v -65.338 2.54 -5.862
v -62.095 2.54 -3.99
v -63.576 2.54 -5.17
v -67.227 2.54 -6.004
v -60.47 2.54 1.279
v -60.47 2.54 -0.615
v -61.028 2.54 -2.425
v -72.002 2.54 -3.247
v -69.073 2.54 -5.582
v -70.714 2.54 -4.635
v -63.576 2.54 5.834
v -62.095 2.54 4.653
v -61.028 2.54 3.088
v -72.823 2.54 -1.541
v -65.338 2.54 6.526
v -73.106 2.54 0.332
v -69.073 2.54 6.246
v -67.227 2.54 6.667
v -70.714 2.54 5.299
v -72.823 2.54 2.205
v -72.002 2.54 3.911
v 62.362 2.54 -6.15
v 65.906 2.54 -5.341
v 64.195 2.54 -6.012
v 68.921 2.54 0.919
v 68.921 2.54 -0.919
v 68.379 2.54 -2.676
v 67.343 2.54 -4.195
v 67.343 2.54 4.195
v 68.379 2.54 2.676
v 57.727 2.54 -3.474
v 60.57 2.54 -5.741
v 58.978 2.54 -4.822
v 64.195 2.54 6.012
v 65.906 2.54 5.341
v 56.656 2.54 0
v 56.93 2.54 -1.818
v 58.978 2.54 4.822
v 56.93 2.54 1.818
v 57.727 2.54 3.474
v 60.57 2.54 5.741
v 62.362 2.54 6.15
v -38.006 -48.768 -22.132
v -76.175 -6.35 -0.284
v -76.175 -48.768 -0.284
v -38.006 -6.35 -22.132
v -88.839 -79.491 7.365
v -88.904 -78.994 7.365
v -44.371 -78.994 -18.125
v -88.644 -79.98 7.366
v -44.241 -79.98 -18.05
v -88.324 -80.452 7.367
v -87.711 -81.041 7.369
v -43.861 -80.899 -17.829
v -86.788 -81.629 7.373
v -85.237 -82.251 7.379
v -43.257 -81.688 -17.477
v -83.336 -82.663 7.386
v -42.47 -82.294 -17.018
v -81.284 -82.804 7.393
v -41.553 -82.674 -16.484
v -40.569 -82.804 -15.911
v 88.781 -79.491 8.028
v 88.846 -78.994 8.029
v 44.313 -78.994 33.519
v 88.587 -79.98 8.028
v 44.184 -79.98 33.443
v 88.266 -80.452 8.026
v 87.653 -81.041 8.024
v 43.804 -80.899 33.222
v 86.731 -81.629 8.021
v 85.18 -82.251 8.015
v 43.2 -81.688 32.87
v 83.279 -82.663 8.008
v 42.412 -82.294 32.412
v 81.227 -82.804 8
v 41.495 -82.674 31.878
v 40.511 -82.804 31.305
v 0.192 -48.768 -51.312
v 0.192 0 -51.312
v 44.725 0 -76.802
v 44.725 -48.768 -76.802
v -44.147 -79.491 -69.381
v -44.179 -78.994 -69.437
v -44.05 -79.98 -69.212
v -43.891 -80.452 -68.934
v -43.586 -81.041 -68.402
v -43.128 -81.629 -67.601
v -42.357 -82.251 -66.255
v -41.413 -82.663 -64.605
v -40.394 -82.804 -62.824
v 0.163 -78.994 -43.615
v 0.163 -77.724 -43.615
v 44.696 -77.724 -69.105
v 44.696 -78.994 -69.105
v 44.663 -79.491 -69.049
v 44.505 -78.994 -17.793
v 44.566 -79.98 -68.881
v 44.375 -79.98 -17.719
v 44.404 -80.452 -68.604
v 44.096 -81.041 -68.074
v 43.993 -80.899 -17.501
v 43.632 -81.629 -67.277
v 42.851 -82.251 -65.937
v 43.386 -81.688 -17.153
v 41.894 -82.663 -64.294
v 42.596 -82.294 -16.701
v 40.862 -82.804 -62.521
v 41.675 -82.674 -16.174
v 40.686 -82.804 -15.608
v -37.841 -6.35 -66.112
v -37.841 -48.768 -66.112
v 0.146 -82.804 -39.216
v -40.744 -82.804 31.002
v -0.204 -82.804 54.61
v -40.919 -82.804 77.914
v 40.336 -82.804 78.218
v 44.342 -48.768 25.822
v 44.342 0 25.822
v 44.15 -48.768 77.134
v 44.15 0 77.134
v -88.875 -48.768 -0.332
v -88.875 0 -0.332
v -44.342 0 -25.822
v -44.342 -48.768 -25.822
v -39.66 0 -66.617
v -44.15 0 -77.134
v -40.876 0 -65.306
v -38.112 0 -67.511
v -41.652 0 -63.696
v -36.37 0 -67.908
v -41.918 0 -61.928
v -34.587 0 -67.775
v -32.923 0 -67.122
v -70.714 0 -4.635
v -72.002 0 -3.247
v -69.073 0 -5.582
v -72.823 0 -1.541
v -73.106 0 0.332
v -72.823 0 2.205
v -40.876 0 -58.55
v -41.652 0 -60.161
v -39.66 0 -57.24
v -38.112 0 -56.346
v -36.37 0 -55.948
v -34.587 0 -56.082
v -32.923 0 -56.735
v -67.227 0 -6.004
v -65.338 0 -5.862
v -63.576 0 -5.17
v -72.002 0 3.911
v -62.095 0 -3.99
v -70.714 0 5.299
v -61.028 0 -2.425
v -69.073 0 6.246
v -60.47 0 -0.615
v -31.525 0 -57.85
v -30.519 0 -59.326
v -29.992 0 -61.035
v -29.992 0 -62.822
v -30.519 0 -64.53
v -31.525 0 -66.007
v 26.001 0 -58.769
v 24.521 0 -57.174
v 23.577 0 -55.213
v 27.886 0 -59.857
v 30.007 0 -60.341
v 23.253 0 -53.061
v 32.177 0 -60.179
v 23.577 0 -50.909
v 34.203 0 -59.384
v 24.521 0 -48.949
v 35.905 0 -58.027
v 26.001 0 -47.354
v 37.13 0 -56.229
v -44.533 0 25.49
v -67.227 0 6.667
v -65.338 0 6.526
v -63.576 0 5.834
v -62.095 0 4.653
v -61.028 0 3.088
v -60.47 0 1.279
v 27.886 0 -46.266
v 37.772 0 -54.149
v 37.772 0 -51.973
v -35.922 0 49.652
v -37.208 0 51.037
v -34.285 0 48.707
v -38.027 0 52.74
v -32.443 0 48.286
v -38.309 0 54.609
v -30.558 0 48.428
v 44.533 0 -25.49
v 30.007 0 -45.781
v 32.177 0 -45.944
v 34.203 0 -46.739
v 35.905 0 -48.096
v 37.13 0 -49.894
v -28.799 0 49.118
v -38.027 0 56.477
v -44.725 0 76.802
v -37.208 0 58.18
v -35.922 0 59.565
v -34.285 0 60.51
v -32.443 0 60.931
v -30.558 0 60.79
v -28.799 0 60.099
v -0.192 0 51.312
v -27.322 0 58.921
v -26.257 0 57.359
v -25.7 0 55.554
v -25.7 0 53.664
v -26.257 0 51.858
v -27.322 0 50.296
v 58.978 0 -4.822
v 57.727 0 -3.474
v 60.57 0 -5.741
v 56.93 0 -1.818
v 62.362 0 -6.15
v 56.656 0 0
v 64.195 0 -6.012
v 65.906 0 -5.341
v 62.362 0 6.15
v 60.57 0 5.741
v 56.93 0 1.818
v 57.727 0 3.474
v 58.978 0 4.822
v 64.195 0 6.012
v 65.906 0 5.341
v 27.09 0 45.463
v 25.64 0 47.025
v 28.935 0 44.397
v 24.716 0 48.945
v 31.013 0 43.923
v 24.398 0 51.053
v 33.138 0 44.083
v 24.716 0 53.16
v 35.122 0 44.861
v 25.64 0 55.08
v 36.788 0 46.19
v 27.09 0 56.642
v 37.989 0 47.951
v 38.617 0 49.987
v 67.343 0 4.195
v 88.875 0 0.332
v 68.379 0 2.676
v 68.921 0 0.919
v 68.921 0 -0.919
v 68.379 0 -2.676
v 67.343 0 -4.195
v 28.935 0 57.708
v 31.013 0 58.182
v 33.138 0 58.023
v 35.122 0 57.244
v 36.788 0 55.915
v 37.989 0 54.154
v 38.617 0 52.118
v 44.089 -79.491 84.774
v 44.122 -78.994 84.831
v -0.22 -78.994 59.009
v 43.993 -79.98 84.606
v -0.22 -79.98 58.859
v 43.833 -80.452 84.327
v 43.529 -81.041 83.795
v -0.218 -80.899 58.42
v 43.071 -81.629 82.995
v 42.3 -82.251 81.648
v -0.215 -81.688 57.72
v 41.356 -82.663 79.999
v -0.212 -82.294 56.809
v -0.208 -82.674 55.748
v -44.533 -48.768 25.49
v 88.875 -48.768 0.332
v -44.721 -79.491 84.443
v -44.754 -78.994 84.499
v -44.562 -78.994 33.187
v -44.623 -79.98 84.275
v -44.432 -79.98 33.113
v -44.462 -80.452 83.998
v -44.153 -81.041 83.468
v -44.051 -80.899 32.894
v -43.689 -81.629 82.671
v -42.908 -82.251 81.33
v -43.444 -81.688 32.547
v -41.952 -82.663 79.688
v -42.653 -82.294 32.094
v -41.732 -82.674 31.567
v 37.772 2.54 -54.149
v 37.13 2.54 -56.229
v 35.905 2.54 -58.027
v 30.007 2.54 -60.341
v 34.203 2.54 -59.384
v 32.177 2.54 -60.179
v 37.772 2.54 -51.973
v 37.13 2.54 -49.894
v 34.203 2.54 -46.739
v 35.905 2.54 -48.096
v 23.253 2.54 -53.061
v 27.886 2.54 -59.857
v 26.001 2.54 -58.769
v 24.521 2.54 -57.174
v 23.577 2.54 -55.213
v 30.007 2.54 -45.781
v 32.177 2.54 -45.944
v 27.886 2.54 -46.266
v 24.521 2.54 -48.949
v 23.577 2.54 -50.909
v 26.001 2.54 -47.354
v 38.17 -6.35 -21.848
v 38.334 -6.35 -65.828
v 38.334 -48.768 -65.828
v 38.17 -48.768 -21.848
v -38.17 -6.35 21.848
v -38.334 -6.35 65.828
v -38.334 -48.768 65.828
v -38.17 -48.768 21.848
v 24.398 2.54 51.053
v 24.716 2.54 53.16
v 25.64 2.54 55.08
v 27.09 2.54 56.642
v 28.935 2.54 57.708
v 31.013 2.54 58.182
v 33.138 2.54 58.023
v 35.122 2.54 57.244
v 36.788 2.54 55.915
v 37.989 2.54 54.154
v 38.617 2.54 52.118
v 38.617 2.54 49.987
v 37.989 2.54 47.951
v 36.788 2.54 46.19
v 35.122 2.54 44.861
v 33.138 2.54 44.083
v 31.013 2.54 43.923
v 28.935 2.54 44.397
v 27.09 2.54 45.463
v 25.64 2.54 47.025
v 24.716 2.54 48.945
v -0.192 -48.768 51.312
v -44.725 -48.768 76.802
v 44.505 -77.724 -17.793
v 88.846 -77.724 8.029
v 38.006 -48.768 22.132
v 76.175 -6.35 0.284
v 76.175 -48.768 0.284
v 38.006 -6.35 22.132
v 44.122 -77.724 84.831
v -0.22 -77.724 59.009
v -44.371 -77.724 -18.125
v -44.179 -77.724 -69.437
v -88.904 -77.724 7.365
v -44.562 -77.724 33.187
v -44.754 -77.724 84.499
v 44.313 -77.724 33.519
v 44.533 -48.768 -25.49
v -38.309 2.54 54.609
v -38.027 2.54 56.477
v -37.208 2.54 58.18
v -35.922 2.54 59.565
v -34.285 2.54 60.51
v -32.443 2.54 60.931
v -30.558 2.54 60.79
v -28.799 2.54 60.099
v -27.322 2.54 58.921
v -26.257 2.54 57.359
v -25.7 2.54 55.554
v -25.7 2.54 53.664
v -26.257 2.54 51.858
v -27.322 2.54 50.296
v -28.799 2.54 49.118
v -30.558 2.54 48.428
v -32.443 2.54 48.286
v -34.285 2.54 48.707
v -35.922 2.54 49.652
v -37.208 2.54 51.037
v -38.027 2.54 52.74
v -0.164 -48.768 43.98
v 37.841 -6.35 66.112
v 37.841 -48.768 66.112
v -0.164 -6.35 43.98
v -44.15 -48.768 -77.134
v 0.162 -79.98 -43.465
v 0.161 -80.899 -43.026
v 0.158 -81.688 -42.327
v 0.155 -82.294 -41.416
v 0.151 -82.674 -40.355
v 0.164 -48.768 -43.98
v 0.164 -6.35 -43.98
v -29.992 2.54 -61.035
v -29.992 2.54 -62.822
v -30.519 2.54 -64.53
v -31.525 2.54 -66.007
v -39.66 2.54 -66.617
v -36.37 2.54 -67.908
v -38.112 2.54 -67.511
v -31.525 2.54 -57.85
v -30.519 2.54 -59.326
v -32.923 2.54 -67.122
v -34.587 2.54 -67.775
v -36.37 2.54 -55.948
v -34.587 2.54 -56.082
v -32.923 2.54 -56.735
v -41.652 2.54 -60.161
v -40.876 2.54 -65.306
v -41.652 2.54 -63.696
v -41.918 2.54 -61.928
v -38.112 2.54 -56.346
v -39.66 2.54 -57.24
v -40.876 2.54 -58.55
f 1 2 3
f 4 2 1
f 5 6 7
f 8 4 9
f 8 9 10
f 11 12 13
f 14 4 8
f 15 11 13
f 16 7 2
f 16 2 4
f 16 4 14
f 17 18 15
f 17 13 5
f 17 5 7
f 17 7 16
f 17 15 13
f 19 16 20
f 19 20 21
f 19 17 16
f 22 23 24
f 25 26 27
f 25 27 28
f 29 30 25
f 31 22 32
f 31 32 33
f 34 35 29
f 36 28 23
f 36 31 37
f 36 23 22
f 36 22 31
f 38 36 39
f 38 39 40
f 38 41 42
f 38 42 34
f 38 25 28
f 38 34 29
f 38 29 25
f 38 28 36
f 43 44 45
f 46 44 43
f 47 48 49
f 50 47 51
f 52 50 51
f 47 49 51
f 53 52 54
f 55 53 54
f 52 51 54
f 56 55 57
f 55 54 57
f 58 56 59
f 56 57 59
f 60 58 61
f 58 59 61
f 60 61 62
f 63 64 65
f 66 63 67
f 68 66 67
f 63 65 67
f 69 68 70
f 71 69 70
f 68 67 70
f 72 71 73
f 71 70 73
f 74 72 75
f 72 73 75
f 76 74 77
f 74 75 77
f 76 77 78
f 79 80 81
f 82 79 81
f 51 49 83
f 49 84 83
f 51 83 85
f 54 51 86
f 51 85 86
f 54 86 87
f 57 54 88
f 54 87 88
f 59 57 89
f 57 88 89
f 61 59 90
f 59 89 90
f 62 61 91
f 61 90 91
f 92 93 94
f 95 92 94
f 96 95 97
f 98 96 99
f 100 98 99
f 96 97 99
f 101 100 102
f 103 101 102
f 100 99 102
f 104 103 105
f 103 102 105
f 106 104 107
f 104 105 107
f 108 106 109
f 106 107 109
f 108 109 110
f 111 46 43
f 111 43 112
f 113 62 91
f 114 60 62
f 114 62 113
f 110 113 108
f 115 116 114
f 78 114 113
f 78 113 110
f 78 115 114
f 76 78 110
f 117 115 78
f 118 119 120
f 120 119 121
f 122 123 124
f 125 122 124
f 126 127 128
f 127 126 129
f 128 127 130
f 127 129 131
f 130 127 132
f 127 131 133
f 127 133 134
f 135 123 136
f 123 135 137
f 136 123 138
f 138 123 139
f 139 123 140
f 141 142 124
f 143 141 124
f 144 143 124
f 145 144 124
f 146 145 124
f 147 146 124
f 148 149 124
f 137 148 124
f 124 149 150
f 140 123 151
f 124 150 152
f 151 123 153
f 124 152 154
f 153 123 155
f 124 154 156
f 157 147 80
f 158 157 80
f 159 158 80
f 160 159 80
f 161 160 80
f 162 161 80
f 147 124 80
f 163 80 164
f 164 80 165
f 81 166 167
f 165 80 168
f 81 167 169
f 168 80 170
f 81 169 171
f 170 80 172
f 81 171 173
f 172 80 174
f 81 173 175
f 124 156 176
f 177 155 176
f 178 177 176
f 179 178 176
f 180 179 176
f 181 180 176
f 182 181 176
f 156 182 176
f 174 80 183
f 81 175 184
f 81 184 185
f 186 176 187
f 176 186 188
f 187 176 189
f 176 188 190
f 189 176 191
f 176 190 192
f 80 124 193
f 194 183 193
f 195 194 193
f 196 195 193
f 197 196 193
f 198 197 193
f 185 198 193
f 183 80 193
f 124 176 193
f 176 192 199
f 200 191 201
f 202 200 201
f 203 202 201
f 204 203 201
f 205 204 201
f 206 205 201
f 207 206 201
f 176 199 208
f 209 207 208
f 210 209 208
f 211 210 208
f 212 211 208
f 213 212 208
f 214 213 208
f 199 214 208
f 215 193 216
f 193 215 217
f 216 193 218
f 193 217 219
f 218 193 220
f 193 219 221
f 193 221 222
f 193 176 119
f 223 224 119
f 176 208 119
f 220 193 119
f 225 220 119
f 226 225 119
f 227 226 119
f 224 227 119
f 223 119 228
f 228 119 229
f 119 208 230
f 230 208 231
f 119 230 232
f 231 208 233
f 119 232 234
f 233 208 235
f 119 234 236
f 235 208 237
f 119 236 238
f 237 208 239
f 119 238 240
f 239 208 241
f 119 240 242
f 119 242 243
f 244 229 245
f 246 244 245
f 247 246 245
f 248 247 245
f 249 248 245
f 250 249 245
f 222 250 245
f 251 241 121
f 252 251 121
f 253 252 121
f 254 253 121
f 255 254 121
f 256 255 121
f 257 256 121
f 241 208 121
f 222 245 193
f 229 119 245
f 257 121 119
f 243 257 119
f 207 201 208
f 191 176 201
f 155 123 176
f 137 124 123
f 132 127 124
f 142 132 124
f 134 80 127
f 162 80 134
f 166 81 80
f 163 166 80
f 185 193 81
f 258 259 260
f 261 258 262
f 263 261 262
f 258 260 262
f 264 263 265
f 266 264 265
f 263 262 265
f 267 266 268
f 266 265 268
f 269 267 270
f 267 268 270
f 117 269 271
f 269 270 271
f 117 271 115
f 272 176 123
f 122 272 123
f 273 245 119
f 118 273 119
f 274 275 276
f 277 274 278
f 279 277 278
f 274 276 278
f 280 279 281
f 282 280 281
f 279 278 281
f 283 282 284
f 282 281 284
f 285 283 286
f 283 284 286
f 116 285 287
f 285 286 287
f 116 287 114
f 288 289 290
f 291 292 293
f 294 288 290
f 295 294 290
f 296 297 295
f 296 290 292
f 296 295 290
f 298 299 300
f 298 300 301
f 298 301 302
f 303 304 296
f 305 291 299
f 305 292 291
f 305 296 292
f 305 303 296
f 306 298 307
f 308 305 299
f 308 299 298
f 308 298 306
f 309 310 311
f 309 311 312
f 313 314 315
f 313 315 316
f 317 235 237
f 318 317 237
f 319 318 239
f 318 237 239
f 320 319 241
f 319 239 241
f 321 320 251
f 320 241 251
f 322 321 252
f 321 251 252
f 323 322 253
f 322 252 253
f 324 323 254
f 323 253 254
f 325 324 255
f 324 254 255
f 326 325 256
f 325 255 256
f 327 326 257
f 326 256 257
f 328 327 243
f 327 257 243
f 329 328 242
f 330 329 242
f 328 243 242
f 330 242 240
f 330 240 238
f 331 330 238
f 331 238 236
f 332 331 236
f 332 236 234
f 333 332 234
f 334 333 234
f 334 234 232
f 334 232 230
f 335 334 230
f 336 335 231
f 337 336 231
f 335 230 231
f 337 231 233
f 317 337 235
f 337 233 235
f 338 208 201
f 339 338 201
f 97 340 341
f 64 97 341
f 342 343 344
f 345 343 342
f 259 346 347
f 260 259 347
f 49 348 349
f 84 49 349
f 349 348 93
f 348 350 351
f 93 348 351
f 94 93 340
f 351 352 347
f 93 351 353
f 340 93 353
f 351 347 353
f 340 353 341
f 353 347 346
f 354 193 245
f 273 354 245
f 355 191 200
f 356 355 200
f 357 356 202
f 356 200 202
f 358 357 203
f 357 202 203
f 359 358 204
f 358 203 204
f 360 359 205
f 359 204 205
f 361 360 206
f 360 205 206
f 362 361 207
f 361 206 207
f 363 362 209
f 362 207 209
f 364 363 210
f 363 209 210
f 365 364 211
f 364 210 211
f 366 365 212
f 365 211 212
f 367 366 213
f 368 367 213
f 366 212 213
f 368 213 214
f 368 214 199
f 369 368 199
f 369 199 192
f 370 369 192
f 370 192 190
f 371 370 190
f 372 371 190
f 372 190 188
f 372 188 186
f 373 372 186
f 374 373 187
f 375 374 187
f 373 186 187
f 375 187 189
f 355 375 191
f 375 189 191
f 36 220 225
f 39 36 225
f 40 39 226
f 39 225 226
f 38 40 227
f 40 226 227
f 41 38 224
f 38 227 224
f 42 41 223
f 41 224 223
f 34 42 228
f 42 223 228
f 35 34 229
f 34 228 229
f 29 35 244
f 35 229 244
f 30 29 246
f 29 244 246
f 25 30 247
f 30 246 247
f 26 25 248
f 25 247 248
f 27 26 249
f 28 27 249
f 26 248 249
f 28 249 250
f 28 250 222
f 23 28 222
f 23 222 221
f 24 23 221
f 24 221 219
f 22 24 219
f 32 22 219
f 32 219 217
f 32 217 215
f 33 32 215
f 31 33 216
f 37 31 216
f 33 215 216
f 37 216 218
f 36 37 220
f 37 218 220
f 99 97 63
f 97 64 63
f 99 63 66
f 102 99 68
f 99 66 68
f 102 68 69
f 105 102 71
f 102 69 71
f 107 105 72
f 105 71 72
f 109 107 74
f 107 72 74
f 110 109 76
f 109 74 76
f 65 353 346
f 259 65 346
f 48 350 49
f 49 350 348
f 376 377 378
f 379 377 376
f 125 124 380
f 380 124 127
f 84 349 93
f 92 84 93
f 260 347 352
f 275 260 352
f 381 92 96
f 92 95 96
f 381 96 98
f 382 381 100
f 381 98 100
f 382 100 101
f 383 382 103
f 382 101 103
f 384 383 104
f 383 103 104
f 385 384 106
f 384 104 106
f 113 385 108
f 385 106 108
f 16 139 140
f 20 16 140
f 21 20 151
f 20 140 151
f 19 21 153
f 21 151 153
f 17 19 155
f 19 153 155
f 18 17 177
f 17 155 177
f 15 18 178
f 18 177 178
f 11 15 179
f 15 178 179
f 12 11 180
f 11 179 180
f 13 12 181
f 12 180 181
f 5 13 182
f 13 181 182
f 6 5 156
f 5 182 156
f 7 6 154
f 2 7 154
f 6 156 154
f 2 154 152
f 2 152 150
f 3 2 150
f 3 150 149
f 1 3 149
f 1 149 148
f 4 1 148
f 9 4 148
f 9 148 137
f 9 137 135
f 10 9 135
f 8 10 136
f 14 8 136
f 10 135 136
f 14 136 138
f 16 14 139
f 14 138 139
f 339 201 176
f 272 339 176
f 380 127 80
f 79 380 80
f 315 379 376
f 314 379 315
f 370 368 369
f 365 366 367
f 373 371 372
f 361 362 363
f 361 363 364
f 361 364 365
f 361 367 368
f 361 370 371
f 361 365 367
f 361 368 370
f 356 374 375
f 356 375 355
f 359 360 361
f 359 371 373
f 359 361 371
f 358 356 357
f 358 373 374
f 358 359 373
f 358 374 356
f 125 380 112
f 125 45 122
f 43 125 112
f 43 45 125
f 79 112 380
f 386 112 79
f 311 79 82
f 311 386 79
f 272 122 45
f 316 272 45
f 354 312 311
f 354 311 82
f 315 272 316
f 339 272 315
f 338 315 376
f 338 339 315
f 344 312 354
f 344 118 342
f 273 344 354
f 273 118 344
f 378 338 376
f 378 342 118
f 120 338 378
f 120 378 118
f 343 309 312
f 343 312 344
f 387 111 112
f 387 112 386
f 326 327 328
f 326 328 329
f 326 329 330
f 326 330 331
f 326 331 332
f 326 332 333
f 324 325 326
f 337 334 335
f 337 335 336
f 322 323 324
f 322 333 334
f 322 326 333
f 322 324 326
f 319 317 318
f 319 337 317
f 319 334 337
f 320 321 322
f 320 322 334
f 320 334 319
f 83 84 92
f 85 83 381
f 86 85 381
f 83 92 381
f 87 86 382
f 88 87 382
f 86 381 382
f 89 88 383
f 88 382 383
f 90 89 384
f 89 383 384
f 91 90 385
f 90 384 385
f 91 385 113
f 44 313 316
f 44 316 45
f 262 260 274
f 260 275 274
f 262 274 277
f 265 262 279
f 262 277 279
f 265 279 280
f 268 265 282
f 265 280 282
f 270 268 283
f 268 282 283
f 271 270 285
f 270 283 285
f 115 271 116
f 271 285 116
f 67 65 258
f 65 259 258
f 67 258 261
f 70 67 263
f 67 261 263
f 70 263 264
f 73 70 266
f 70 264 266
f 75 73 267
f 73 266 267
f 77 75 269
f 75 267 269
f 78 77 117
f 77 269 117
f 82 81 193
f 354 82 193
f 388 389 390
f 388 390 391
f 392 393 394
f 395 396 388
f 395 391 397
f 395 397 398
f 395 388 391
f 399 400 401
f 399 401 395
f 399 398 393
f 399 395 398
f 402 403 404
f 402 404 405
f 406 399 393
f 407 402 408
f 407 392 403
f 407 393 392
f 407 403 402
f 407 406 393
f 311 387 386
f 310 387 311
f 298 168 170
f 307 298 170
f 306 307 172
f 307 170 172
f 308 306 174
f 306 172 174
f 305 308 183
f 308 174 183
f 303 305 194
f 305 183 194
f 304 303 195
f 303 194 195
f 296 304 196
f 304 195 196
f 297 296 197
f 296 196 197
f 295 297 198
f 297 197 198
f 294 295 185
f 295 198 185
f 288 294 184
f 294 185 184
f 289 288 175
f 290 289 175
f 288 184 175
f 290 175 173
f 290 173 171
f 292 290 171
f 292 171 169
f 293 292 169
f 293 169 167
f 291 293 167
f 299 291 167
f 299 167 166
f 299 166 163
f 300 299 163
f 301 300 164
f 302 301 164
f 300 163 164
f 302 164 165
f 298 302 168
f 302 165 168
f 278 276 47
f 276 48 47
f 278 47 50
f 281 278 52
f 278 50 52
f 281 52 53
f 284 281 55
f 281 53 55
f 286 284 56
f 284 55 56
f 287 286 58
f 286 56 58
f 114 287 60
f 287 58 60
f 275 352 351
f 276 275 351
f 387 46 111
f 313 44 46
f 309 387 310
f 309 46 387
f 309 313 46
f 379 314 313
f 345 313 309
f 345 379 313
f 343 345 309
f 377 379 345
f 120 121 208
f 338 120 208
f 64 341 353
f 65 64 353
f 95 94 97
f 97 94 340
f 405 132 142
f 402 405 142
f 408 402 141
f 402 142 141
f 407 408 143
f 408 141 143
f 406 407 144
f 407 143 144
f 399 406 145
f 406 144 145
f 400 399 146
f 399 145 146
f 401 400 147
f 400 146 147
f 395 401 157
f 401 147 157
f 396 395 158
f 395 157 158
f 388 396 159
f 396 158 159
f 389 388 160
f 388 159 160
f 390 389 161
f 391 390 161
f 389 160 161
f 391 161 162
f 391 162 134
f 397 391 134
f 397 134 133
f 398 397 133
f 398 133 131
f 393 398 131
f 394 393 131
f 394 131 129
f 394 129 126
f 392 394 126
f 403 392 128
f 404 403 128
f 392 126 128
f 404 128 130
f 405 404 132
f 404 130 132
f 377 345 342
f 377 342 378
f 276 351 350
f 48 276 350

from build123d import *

# Parameters (mm, degrees)
F1_DEPTH = 48.768
F2_T     = -6.35
F5_DEPTH = 5.08
F6_R     = 3.81
F7_R     = 7.149277817
F7_R_2   = 6.167018534
F7_R_3   = 7.300427835
F7_R_4   = 6.3398863897
F7_R_5   = 6.3534148233
F7_R_6   = 5.9967453777
F8_DEPTH = 2.54


with BuildPart() as f1:
    # F0 (on Front) → F1 (new body)
    with BuildSketch(Plane.XZ):
        Polygon((0.1915691198, -51.3121148991), (44.5333795844, -25.4901537252), (44.3418104646, 25.8219611739), (-0.1915691198, 51.3121148991), (-44.5333795844, 25.4901537252), (-44.3418104646, -25.8219611739), align=None)
        Polygon((-0.1915691198, 51.3121148991), (44.3418104646, 25.8219611739), (44.1502413448, 77.134076073), align=None)
        Polygon((44.5333795844, -25.4901537252), (88.875190049, 0.3318074487), (44.3418104646, 25.8219611739), align=None)
        Polygon((44.7249487042, -76.8022686243), (44.5333795844, -25.4901537252), (0.1915691198, -51.3121148991), align=None)
        Polygon((-44.1502413448, -77.134076073), (0.1915691198, -51.3121148991), (-44.3418104646, -25.8219611739), align=None)
        Polygon((-88.875190049, -0.3318074487), (-44.3418104646, -25.8219611739), (-44.5333795844, 25.4901537252), align=None)
        Polygon((-44.5333795844, 25.4901537252), (-0.1915691198, 51.3121148991), (-44.7249487042, 76.8022686243), align=None)
    extrude(amount=F1_DEPTH)

    # F2
    f2_openings = [f1.faces().sort_by_distance(p)[0] for p in [
        (0, -48.768, 0),
    ]]
    offset(amount=F2_T, openings=f2_openings, kind=Kind.INTERSECTION)

    # F7 (on face) → F8 (join)
    with BuildSketch(Plane(origin=(0, 0, 0), x_dir=(-1, 0, 0), z_dir=(0, 1, 0))):
        with Locations((-31.5473228693, 51.052544266)):
            Circle(F7_R)
        with Locations((-62.8226846457, 0)):
            Circle(F7_R_2)
        with Locations((-30.5529385805, -53.0613288283)):
            Circle(F7_R_3)
        with Locations((31.9692417979, 54.6085909009)):
            Circle(F7_R_4)
        with Locations((66.7522624135, 0.3318074487)):
            Circle(F7_R_5)
        with Locations((35.9214060009, -61.9283765554)):
            Circle(F7_R_6)
    extrude(amount=F8_DEPTH)


with BuildPart() as f5:
    # F4 (on offset) → F5 (new body)
    with BuildSketch(Plane.XZ.offset(77.724)):
        Polygon((44.5046442165, -17.7933364903), (88.8464546811, 8.0286246835), (44.3130750966, 33.5187784088), align=None)
        Polygon((44.6962133363, -69.1054513894), (44.5046442165, -17.7933364903), (0.1628337518, -43.6152976642), align=None)
        Polygon((0.1628337518, -43.6152976642), (44.5046442165, -17.7933364903), (44.3130750966, 33.5187784088), (-0.2203044878, 59.008932134), (-44.5621149524, 33.1869709601), (-44.3705458326, -18.125143939), align=None)
        Polygon((-0.2203044878, 59.008932134), (44.3130750966, 33.5187784088), (44.1215059768, 84.8308933078), align=None)
        Polygon((-44.1789767128, -69.4372588381), (0.1628337518, -43.6152976642), (-44.3705458326, -18.125143939), align=None)
        Polygon((-44.5621149524, 33.1869709601), (-0.2203044878, 59.008932134), (-44.7536840722, 84.4990858592), align=None)
        Polygon((-88.903925417, 7.3650097862), (-44.3705458326, -18.125143939), (-44.5621149524, 33.1869709601), align=None)
    extrude(amount=F5_DEPTH)

    # F6
    f6_edges = [f5.edges().sort_by_distance(p)[0] for p in [
        (66.675549, -82.804, -4.882356),
        (66.579765, -82.804, 20.773702),
        (44.217291, -82.804, 59.174836),
        (21.950601, -82.804, 71.919913),
        (-22.486994, -82.804, 71.754009),
        (-44.6579, -82.804, 58.843028),
        (-66.73302, -82.804, 20.27599),
        (-66.637236, -82.804, -5.380067),
        (-44.274761, -82.804, -43.781201),
        (-22.008071, -82.804, -56.526278),
        (22.429524, -82.804, -56.360375),
        (44.600429, -82.804, -43.449394),
    ]]
    fillet(f6_edges, radius=F6_R)


solid = Compound([f1.part, f5.part])
